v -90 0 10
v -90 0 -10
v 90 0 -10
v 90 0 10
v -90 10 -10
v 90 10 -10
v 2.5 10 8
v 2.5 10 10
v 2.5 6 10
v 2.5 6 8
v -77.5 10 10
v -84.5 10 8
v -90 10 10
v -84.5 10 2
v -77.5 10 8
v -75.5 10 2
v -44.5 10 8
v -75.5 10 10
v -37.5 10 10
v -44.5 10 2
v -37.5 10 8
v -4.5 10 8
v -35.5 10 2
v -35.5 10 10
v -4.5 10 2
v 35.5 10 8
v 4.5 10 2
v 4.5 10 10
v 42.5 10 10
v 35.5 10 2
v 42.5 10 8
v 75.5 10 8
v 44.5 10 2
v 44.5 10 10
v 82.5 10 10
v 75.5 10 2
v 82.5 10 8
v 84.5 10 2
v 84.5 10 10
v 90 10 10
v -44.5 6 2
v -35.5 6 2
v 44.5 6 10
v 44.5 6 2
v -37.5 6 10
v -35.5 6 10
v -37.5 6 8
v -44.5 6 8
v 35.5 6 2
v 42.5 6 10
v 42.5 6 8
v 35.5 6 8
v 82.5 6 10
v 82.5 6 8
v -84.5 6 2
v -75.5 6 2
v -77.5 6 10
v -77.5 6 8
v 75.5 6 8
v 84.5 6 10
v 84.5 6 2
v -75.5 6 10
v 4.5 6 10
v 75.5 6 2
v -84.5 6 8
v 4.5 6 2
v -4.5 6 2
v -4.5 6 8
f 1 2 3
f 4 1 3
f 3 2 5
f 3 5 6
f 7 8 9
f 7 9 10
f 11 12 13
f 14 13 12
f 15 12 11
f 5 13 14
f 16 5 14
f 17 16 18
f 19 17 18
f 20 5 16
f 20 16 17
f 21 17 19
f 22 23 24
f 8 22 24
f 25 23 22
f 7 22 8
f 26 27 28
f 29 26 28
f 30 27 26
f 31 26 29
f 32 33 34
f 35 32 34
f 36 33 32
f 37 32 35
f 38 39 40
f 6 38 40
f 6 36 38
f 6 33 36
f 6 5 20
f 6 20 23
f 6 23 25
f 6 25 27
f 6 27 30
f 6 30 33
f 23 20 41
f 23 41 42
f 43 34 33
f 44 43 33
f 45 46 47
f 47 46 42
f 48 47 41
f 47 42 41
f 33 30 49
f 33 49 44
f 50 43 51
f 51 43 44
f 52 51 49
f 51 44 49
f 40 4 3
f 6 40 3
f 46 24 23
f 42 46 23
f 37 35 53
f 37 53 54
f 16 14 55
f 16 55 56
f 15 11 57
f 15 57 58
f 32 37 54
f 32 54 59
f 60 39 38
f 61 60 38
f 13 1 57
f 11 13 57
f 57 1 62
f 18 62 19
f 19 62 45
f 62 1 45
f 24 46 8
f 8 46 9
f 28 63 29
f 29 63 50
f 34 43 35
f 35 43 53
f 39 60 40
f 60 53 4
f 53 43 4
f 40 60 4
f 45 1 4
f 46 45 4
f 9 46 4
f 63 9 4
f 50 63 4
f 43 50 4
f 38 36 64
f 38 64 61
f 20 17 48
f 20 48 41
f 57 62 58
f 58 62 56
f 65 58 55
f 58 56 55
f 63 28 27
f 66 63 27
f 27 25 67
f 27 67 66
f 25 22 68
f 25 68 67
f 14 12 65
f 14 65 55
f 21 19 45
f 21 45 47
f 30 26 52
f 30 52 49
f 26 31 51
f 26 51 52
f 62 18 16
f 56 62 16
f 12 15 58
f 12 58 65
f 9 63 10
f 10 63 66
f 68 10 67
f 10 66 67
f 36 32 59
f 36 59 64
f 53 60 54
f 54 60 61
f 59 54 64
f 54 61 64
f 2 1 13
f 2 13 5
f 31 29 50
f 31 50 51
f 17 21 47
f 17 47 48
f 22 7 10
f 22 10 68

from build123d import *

# Parameters (mm, degrees)
SKETCH1_W           = 180
SKETCH1_H           = 20
BOSS_EXTRUDE1_DEPTH = 10
CUT_EXTRUDE2_DEPTH  = 4


with BuildPart() as part:
    # Sketch1 → Boss-Extrude1 (new body)
    with BuildSketch(Plane(origin=(0, 0, 0), x_dir=(1, 0, 0), z_dir=(0, 1, 0))):
        Rectangle(SKETCH1_W, SKETCH1_H)
    extrude(amount=BOSS_EXTRUDE1_DEPTH)

    # Sketch2 → Cut-Extrude2 (cut)
    with BuildSketch(Plane(origin=(0, 10, 0), x_dir=(1, 0, 0), z_dir=(0, 1, 0))):
        Polygon((84.5, -2), (84.5, -7.781340665), (84.5, -10), (82.5, -10), (82.5, -8), (75.5, -8), (75.5, -2), align=None)
        Polygon((44.5, -2), (44.5, -7.781340665), (44.5, -10), (42.5, -10), (42.5, -8), (35.5, -8), (35.5, -2), align=None)
        Polygon((4.5, -2), (4.5, -7.781340665), (4.5, -10), (2.5, -10), (2.5, -8), (-4.5, -8), (-4.5, -2), align=None)
        Polygon((-35.5, -2), (-35.5, -7.781340665), (-35.5, -10), (-37.5, -10), (-37.5, -8), (-44.5, -8), (-44.5, -2), align=None)
        Polygon((-75.5, -2), (-75.5, -7.781340665), (-75.5, -10), (-77.5, -10), (-77.5, -8), (-84.5, -8), (-84.5, -2), align=None)
    extrude(amount=-CUT_EXTRUDE2_DEPTH, mode=Mode.SUBTRACT)


solid = part.part
